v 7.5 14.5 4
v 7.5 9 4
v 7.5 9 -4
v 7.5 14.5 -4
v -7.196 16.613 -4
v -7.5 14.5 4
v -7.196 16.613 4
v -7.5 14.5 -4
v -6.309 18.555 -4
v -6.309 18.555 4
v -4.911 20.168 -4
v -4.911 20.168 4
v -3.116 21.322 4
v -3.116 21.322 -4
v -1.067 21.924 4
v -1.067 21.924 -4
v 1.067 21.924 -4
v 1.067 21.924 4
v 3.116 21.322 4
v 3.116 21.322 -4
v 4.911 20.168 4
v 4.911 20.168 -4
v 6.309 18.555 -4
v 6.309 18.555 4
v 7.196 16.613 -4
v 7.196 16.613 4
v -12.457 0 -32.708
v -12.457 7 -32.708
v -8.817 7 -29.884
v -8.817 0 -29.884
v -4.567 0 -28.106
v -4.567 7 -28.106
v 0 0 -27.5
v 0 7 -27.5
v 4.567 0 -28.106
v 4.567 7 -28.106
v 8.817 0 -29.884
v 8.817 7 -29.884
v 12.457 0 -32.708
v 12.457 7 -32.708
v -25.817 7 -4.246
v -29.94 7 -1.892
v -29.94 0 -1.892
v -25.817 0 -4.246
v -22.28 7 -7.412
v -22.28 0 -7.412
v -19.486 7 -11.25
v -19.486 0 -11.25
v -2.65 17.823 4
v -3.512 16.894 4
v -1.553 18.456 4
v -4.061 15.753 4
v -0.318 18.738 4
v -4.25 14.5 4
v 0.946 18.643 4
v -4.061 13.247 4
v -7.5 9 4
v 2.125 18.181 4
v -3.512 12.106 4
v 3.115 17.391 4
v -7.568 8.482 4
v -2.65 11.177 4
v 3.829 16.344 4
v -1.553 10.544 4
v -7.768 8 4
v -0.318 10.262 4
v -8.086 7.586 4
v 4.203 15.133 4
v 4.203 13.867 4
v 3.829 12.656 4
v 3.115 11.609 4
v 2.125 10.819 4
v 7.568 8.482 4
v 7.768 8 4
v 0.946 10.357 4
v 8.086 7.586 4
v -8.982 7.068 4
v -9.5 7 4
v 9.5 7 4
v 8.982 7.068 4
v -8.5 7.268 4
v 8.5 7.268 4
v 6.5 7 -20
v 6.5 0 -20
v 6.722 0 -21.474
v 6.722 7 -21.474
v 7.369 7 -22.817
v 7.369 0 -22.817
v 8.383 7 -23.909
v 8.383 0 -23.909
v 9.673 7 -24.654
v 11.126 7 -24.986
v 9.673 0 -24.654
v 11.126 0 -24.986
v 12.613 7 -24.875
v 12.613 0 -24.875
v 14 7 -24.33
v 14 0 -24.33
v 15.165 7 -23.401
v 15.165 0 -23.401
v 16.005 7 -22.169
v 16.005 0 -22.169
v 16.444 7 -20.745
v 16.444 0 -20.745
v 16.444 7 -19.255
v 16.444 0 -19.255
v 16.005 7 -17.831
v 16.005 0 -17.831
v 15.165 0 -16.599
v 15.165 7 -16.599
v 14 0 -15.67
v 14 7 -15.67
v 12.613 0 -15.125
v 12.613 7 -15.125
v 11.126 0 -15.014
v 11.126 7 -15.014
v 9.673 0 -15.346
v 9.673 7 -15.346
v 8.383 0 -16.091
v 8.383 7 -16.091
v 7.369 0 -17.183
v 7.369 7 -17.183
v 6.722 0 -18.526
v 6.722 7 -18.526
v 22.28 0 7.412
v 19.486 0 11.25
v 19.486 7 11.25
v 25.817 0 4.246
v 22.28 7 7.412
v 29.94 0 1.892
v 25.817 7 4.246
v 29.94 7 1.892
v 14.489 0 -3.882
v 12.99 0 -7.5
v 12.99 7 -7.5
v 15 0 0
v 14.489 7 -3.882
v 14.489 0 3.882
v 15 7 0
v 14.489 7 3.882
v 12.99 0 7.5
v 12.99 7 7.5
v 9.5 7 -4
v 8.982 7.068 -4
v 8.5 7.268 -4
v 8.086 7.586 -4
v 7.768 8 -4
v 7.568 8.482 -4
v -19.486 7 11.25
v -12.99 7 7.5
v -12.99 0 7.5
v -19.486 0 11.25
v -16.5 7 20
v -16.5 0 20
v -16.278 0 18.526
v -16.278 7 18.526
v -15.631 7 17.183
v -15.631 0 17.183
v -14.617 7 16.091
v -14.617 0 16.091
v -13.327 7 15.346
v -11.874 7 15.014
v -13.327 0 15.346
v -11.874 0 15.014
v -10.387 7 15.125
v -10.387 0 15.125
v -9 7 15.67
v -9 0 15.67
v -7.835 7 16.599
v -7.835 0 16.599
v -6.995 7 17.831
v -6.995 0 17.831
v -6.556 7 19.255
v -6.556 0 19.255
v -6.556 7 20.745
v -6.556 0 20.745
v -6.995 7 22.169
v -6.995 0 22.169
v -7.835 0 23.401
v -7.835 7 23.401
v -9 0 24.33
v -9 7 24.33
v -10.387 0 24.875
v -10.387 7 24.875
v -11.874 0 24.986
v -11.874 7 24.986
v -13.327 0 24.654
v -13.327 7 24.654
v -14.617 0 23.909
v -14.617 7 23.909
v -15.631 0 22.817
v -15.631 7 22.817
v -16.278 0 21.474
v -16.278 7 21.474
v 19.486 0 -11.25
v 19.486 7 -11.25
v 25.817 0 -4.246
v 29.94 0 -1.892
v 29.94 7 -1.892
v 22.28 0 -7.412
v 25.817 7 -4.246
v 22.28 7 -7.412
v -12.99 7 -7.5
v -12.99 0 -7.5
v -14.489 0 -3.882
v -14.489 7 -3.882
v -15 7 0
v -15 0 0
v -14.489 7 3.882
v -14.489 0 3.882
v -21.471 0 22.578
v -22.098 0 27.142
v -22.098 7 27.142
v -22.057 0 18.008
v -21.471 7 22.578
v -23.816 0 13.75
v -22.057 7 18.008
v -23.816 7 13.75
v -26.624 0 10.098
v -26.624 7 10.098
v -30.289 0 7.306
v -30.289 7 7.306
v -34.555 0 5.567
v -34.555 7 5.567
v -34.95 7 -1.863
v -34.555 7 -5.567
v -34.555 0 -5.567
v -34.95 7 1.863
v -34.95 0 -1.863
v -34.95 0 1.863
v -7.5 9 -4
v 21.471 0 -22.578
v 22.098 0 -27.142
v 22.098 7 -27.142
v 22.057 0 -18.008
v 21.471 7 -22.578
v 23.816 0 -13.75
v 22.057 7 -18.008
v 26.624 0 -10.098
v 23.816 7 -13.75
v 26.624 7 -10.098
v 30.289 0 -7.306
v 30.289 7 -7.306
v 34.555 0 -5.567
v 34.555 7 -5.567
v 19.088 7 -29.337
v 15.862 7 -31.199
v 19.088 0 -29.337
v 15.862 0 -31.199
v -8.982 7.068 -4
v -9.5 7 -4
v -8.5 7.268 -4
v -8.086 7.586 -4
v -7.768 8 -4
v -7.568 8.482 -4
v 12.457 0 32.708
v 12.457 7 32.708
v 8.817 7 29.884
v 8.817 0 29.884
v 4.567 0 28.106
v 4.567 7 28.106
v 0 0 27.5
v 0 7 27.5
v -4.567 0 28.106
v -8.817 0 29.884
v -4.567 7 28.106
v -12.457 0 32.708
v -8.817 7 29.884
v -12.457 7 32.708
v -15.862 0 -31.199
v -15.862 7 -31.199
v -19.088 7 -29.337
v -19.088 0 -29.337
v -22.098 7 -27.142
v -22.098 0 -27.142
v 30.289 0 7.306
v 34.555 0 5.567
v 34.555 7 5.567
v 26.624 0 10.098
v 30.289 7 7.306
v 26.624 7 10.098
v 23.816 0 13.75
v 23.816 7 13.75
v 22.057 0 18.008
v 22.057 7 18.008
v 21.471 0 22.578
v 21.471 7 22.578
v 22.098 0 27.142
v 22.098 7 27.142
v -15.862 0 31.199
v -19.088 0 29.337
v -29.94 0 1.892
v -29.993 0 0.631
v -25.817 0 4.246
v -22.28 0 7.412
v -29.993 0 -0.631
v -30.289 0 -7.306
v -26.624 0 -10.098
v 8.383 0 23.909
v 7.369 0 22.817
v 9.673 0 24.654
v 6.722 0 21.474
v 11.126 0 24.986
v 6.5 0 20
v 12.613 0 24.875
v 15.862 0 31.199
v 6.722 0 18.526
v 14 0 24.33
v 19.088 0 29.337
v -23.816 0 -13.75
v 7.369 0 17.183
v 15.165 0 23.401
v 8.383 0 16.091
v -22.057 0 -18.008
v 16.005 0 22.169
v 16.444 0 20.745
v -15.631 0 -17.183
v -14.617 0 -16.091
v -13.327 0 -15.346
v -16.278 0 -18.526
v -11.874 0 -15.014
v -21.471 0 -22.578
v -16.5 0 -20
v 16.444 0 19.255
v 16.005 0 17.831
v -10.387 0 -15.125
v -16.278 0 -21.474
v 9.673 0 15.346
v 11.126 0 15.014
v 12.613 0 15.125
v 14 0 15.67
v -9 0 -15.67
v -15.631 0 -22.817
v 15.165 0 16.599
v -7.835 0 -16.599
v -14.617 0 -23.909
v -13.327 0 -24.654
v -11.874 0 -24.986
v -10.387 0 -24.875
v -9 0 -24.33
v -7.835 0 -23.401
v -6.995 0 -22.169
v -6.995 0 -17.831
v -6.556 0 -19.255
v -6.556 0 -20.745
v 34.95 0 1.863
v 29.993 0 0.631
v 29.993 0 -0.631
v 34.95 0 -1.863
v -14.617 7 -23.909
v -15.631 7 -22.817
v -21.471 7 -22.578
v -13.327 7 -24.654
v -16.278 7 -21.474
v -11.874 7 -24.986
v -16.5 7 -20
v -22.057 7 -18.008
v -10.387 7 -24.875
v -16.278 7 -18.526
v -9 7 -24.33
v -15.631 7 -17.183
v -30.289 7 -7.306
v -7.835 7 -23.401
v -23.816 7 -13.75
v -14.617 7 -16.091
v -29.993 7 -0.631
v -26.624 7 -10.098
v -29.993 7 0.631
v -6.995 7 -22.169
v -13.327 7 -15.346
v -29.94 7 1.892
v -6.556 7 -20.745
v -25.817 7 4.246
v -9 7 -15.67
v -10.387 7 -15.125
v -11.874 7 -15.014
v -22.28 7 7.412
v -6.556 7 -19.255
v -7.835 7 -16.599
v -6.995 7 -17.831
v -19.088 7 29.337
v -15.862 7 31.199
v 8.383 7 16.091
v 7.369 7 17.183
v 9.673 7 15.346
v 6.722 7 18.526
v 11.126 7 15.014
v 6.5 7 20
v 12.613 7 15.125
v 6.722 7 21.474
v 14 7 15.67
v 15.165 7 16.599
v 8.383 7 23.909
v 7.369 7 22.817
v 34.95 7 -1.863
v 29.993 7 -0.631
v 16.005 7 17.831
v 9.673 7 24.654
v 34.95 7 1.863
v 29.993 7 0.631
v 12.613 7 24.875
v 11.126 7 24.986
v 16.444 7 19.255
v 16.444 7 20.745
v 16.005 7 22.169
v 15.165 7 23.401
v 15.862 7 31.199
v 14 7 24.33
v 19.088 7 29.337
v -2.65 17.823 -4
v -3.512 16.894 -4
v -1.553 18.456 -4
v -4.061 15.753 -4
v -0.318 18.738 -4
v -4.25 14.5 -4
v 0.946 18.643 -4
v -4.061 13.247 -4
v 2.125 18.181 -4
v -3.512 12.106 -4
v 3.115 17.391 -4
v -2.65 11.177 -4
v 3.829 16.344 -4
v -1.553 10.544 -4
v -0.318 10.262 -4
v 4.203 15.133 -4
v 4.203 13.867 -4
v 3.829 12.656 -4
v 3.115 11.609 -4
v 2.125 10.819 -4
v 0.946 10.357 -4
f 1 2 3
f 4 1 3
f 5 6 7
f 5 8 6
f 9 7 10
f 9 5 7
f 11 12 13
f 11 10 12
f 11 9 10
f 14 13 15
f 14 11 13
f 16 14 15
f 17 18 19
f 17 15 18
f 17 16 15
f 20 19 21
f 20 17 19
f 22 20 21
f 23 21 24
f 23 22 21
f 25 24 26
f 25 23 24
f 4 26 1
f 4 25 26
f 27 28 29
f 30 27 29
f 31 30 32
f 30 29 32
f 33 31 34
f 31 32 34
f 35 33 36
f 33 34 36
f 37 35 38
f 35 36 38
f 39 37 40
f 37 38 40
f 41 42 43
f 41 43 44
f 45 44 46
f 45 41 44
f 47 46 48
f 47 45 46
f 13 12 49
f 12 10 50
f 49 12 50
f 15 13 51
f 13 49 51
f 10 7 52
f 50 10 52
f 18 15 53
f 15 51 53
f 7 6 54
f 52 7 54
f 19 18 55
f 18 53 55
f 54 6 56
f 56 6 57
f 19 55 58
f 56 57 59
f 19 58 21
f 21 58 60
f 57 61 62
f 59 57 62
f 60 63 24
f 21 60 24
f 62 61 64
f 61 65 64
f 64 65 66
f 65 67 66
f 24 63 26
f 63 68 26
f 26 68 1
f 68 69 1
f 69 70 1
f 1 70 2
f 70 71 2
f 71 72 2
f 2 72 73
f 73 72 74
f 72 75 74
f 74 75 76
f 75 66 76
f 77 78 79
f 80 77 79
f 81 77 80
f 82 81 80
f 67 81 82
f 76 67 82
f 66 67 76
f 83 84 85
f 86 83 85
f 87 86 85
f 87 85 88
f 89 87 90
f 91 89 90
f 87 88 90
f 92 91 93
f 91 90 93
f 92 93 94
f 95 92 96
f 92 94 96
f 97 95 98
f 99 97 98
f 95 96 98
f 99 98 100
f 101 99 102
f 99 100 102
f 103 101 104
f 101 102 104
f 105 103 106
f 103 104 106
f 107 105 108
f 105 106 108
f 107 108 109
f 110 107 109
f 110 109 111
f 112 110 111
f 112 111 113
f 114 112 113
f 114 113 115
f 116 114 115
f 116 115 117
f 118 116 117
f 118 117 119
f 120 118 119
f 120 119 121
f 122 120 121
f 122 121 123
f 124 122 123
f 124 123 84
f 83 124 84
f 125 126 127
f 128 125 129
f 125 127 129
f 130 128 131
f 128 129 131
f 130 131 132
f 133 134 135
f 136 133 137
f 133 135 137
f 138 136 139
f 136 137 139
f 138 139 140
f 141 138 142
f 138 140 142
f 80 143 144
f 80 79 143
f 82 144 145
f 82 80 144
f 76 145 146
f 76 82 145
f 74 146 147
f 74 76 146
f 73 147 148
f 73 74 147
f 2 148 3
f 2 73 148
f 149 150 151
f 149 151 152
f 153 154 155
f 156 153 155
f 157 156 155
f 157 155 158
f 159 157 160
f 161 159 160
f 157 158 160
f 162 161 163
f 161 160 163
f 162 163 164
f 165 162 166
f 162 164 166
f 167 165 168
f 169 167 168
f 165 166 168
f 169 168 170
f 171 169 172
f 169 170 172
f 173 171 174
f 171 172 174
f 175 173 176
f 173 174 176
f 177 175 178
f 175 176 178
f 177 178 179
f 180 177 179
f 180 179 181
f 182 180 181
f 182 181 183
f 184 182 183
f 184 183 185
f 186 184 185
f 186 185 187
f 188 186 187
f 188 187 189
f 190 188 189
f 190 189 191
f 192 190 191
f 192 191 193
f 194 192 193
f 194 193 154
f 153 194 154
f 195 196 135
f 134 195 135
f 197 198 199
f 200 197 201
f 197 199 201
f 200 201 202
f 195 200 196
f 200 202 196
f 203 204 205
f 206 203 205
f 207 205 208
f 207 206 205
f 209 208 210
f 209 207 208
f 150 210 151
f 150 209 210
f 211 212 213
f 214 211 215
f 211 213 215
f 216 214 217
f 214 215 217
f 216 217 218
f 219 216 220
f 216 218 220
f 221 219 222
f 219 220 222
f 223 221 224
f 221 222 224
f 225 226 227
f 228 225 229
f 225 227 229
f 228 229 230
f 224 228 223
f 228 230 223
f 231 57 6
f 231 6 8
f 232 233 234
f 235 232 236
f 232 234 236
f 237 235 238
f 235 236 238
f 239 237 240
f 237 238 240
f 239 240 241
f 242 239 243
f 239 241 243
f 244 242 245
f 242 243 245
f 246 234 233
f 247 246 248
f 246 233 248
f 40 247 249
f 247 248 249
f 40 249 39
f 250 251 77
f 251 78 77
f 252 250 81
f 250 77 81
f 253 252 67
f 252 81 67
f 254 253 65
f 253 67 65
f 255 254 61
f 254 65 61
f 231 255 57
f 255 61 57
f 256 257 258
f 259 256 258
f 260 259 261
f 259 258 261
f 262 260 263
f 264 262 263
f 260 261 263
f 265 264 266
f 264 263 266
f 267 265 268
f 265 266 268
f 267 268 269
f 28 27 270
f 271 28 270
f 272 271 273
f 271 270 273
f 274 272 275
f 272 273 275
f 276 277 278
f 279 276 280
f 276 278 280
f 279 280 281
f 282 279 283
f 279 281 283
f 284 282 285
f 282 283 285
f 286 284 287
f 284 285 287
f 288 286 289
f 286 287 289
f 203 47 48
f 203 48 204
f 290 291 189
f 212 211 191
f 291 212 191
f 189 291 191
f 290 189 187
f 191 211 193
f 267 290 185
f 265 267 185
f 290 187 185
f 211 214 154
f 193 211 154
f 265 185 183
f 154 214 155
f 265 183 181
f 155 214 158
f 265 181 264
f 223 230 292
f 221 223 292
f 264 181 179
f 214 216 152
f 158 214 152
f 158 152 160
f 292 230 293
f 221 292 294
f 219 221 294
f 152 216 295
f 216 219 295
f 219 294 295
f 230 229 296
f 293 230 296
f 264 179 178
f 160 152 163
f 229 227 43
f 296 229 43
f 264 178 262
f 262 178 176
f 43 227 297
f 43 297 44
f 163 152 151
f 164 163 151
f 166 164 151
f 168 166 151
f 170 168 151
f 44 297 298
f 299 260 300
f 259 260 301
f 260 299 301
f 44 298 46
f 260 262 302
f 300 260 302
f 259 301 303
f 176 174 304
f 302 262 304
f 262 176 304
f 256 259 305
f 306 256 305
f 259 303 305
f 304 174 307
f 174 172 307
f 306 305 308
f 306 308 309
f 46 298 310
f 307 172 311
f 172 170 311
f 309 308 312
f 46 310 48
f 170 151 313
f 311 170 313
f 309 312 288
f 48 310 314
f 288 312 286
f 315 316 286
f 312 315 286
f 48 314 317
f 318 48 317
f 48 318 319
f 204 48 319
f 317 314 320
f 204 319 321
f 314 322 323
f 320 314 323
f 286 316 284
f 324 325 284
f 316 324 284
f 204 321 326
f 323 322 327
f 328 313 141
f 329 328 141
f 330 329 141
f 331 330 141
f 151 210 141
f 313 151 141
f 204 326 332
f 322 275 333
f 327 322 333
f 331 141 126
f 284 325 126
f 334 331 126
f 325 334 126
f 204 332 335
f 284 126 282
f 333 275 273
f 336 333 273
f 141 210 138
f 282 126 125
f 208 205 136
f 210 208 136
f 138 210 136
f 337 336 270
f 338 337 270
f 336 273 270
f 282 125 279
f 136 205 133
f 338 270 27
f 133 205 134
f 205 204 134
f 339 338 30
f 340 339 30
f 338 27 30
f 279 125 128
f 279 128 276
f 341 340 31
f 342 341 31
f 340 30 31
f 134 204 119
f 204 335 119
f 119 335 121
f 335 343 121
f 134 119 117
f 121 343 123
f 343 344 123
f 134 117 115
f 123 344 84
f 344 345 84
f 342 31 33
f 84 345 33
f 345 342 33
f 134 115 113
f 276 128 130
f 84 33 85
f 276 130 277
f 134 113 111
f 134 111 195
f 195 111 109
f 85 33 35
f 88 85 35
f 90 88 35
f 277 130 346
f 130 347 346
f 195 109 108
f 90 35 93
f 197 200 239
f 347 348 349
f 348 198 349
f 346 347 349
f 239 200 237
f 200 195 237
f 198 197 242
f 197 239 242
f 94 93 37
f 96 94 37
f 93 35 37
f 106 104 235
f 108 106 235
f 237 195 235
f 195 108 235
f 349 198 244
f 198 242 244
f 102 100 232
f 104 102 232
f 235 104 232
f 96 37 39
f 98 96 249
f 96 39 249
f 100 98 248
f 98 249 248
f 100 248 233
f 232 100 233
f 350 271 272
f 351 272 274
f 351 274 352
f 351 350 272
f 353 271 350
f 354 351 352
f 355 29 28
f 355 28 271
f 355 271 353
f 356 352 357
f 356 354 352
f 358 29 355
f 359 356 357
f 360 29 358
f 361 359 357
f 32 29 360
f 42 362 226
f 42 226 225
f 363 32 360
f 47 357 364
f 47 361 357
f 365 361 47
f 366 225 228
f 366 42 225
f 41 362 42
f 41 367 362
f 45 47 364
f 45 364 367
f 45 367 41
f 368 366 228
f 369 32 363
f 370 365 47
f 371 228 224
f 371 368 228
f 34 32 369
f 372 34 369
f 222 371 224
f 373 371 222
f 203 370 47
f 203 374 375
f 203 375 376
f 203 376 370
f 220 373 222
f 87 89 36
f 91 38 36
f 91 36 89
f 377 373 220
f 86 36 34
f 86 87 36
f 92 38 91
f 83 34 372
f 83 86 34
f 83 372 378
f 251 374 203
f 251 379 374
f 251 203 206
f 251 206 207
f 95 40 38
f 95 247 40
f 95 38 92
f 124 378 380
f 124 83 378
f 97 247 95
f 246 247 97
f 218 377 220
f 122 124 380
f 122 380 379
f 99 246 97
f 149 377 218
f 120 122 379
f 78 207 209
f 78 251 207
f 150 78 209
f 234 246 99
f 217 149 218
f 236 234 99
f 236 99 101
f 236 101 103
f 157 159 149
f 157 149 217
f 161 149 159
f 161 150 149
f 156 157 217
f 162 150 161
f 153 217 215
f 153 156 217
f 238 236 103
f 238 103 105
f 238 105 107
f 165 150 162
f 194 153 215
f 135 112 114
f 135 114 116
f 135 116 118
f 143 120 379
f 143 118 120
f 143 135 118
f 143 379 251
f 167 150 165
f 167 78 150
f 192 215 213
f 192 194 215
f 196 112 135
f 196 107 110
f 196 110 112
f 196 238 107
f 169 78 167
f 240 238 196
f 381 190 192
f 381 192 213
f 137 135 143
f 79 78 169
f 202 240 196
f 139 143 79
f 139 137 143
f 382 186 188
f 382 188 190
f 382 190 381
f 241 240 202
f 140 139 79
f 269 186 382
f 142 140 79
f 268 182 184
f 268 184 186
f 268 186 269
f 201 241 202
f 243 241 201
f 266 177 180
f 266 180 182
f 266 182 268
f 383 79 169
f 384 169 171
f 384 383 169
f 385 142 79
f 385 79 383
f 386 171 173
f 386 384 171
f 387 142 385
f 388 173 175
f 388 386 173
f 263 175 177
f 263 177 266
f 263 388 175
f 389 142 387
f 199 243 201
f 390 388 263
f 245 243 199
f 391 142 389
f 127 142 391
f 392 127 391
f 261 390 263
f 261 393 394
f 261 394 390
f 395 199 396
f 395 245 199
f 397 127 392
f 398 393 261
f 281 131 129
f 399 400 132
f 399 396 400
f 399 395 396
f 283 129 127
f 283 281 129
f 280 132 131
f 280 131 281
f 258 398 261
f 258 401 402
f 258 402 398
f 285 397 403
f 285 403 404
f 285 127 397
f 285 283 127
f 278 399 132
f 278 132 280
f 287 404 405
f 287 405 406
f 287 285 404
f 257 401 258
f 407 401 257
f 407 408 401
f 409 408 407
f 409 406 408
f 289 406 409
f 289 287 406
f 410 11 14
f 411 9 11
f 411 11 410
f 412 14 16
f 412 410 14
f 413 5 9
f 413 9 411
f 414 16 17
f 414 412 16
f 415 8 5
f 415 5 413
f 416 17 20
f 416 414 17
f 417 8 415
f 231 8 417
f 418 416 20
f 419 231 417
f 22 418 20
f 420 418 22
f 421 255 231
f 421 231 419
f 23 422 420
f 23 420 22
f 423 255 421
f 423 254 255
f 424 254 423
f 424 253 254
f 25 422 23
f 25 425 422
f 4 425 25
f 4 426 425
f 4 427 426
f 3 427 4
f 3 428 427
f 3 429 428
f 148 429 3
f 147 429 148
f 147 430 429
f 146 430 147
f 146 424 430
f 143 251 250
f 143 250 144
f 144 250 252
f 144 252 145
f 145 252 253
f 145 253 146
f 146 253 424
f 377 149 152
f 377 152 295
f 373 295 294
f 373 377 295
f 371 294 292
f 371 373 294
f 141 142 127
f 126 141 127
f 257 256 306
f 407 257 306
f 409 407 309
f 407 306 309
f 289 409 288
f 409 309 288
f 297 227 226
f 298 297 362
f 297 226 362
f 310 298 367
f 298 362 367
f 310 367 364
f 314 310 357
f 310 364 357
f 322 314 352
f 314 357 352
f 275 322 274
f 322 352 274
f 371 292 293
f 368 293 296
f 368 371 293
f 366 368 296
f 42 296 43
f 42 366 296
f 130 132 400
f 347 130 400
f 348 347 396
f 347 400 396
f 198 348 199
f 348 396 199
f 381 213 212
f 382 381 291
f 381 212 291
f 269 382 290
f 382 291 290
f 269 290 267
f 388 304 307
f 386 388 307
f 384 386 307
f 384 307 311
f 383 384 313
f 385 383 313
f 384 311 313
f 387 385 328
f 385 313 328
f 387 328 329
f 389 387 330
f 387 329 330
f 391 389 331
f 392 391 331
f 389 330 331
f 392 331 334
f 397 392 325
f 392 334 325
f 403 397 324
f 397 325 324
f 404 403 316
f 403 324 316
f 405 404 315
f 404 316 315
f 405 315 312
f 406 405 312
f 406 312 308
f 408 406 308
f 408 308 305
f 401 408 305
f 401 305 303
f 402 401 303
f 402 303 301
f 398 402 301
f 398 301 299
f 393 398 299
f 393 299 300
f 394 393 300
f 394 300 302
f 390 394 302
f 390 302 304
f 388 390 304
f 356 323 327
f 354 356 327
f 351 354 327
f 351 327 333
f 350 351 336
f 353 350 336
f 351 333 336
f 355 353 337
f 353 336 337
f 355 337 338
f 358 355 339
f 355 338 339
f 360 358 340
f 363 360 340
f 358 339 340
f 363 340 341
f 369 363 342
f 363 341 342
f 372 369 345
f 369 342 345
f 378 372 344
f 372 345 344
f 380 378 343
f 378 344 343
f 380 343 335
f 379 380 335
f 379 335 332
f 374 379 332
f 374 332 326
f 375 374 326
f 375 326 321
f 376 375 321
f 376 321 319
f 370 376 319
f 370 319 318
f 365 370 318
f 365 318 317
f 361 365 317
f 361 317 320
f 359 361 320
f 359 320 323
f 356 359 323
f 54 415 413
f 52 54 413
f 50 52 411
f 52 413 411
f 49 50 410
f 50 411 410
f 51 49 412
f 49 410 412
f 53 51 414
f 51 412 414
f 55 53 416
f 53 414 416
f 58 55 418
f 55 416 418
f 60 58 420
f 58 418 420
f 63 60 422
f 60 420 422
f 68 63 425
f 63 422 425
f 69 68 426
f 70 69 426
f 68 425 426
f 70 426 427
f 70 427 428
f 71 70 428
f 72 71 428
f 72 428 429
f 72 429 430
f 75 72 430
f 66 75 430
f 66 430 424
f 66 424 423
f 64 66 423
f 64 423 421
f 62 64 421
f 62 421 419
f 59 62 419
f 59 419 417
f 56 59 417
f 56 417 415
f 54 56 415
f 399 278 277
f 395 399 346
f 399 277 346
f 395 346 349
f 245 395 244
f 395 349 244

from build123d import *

# Parameters (mm, degrees)
SKETCH1_R                  = 35
BOSS_EXTRUDE1_DEPTH        = 7
SKETCH2_R                  = 17.5
CUT_EXTRUDE1_DEPTH         = 50.989999
CIRPATTERN1_COUNT          = 6
F_10_0_10_DIAMETER_HOLE1_D = 10
LPATTERN1_COUNT            = 2
LPATTERN1_PITCH            = 23
LPATTERN1_COUNT_DIR2       = 2
LPATTERN1_PITCH_DIR2       = 40
CUT_EXTRUDE2_DEPTH         = 49.413170413
SKETCH11_W                 = 15
SKETCH11_H                 = 8
BOSS_EXTRUDE2_DEPTH        = 22
FILLET1_RADIUS             = 7.5
FILLET1_LENGTH             = 8
M10_TAPPED_HOLE1_D         = 8.5
FILLET2_R                  = 2


with BuildPart() as part:
    # Sketch1 → Boss-Extrude1 (new body)
    with BuildSketch(Plane(origin=(0, 0, 0), x_dir=(1, 0, 0), z_dir=(0, 1, 0))):
        with Locations(Location((0, 0, 0), (0, 0, 270))):
            Circle(SKETCH1_R)
    extrude(amount=BOSS_EXTRUDE1_DEPTH)

    # Sketch2 → Cut-Extrude1 (cut, through all)
    with BuildSketch(Plane(origin=(0, 7, 0), x_dir=(1, 0, 0), z_dir=(0, 1, 0))):
        with Locations((0, 45)):
            Circle(SKETCH2_R)
    cut_extrude1 = extrude(amount=-CUT_EXTRUDE1_DEPTH, mode=Mode.SUBTRACT)

    # CirPattern1: Cut-Extrude1 ×6 about axis
    cirpattern1_axis = Axis((0, 0, 0), (0, 1, 0))
    for i in range(1, CIRPATTERN1_COUNT):
        add(cut_extrude1.rotate(cirpattern1_axis, i * 360 / CIRPATTERN1_COUNT), mode=Mode.SUBTRACT)

    # Ø10.0 (10) Diameter Hole1 (through all)
    with Locations(Plane(origin=(0, 7, 0), x_dir=(1, 0, 0), z_dir=(0, 1, 0))):
        with Locations((-11.5, 20)):
            f_10_0_10_diameter_hole1 = Hole(F_10_0_10_DIAMETER_HOLE1_D / 2)

    # LPattern1: 10.0 _10_ Diameter Hole1 2 × 2
    with Locations(*[(i * LPATTERN1_PITCH, 0, j * LPATTERN1_PITCH_DIR2) for i in range(LPATTERN1_COUNT) for j in range(LPATTERN1_COUNT_DIR2) if (i, j) != (0, 0)]):
        add(f_10_0_10_diameter_hole1, mode=Mode.SUBTRACT)

    # Sketch9 → Cut-Extrude2 (cut, through all)
    with BuildSketch(Plane(origin=(0, 7, 0), x_dir=(1, 0, 0), z_dir=(0, 1, 0))):
        with BuildLine():
            Line((12.990381057, -7.5), (19.485571585, -11.25))
            ThreePointArc((19.485571585, -11.25), (23.964805416, -5.735160985), (29.940285542, -1.891904249))
            ThreePointArc((29.940285542, -1.891904249), (30, 0), (29.940285542, 1.891904249))
            ThreePointArc((29.940285542, 1.891904249), (23.964805416, 5.735160985), (19.485571585, 11.25))
            Line((19.485571585, 11.25), (12.990381057, 7.5))
            ThreePointArc((12.990381057, 7.5), (15, 0), (12.990381057, -7.5))
        make_face()
    cut_extrude2 = extrude(amount=-CUT_EXTRUDE2_DEPTH, mode=Mode.SUBTRACT)

    # Mirror1: Cut-Extrude2 across plane
    add(cut_extrude2.mirror(Plane(origin=(0, 0, 0), x_dir=(0, 0, 1), z_dir=(1, 0, 0))), mode=Mode.SUBTRACT)

    # Sketch11 → Boss-Extrude2 (add)
    with BuildSketch(Plane(origin=(0, 0, 0), x_dir=(1, 0, 0), z_dir=(0, 1, 0))):
        Rectangle(SKETCH11_W, SKETCH11_H)
    extrude(amount=BOSS_EXTRUDE2_DEPTH)

    # Fillet1: full round fillet: the end face becomes a half cylinder, R = half its width
    fillet1_face = Plane((0, 22, 0), x_dir=(0, 0, -1), z_dir=(0, 1, 0))  # on the end face: x along it, z out of the body
    fillet1_slab = fillet1_face.offset(-FILLET1_RADIUS / 2) * Box(FILLET1_LENGTH, 2 * FILLET1_RADIUS, FILLET1_RADIUS, mode=Mode.PRIVATE)  # the body's end, R deep
    fillet1_round = Plane((0, 14.5, 0), x_dir=(0, 1, 0), z_dir=(0, 0, -1)) * Cylinder(FILLET1_RADIUS, FILLET1_LENGTH, mode=Mode.PRIVATE)  # its axis R under the face
    add(fillet1_slab - fillet1_round, mode=Mode.SUBTRACT)

    # M10 Tapped Hole1 (through all)
    with Locations(Plane.XY.offset(4)):
        with Locations((0, 14.5)):
            Hole(M10_TAPPED_HOLE1_D / 2)

    # Fillet2
    fillet2_edges = [part.edges().sort_by_distance(p)[0] for p in [
        (7.5, 7, 0),
        (-7.5, 7, 0),
    ]]
    fillet(fillet2_edges, radius=FILLET2_R)


solid = part.part
